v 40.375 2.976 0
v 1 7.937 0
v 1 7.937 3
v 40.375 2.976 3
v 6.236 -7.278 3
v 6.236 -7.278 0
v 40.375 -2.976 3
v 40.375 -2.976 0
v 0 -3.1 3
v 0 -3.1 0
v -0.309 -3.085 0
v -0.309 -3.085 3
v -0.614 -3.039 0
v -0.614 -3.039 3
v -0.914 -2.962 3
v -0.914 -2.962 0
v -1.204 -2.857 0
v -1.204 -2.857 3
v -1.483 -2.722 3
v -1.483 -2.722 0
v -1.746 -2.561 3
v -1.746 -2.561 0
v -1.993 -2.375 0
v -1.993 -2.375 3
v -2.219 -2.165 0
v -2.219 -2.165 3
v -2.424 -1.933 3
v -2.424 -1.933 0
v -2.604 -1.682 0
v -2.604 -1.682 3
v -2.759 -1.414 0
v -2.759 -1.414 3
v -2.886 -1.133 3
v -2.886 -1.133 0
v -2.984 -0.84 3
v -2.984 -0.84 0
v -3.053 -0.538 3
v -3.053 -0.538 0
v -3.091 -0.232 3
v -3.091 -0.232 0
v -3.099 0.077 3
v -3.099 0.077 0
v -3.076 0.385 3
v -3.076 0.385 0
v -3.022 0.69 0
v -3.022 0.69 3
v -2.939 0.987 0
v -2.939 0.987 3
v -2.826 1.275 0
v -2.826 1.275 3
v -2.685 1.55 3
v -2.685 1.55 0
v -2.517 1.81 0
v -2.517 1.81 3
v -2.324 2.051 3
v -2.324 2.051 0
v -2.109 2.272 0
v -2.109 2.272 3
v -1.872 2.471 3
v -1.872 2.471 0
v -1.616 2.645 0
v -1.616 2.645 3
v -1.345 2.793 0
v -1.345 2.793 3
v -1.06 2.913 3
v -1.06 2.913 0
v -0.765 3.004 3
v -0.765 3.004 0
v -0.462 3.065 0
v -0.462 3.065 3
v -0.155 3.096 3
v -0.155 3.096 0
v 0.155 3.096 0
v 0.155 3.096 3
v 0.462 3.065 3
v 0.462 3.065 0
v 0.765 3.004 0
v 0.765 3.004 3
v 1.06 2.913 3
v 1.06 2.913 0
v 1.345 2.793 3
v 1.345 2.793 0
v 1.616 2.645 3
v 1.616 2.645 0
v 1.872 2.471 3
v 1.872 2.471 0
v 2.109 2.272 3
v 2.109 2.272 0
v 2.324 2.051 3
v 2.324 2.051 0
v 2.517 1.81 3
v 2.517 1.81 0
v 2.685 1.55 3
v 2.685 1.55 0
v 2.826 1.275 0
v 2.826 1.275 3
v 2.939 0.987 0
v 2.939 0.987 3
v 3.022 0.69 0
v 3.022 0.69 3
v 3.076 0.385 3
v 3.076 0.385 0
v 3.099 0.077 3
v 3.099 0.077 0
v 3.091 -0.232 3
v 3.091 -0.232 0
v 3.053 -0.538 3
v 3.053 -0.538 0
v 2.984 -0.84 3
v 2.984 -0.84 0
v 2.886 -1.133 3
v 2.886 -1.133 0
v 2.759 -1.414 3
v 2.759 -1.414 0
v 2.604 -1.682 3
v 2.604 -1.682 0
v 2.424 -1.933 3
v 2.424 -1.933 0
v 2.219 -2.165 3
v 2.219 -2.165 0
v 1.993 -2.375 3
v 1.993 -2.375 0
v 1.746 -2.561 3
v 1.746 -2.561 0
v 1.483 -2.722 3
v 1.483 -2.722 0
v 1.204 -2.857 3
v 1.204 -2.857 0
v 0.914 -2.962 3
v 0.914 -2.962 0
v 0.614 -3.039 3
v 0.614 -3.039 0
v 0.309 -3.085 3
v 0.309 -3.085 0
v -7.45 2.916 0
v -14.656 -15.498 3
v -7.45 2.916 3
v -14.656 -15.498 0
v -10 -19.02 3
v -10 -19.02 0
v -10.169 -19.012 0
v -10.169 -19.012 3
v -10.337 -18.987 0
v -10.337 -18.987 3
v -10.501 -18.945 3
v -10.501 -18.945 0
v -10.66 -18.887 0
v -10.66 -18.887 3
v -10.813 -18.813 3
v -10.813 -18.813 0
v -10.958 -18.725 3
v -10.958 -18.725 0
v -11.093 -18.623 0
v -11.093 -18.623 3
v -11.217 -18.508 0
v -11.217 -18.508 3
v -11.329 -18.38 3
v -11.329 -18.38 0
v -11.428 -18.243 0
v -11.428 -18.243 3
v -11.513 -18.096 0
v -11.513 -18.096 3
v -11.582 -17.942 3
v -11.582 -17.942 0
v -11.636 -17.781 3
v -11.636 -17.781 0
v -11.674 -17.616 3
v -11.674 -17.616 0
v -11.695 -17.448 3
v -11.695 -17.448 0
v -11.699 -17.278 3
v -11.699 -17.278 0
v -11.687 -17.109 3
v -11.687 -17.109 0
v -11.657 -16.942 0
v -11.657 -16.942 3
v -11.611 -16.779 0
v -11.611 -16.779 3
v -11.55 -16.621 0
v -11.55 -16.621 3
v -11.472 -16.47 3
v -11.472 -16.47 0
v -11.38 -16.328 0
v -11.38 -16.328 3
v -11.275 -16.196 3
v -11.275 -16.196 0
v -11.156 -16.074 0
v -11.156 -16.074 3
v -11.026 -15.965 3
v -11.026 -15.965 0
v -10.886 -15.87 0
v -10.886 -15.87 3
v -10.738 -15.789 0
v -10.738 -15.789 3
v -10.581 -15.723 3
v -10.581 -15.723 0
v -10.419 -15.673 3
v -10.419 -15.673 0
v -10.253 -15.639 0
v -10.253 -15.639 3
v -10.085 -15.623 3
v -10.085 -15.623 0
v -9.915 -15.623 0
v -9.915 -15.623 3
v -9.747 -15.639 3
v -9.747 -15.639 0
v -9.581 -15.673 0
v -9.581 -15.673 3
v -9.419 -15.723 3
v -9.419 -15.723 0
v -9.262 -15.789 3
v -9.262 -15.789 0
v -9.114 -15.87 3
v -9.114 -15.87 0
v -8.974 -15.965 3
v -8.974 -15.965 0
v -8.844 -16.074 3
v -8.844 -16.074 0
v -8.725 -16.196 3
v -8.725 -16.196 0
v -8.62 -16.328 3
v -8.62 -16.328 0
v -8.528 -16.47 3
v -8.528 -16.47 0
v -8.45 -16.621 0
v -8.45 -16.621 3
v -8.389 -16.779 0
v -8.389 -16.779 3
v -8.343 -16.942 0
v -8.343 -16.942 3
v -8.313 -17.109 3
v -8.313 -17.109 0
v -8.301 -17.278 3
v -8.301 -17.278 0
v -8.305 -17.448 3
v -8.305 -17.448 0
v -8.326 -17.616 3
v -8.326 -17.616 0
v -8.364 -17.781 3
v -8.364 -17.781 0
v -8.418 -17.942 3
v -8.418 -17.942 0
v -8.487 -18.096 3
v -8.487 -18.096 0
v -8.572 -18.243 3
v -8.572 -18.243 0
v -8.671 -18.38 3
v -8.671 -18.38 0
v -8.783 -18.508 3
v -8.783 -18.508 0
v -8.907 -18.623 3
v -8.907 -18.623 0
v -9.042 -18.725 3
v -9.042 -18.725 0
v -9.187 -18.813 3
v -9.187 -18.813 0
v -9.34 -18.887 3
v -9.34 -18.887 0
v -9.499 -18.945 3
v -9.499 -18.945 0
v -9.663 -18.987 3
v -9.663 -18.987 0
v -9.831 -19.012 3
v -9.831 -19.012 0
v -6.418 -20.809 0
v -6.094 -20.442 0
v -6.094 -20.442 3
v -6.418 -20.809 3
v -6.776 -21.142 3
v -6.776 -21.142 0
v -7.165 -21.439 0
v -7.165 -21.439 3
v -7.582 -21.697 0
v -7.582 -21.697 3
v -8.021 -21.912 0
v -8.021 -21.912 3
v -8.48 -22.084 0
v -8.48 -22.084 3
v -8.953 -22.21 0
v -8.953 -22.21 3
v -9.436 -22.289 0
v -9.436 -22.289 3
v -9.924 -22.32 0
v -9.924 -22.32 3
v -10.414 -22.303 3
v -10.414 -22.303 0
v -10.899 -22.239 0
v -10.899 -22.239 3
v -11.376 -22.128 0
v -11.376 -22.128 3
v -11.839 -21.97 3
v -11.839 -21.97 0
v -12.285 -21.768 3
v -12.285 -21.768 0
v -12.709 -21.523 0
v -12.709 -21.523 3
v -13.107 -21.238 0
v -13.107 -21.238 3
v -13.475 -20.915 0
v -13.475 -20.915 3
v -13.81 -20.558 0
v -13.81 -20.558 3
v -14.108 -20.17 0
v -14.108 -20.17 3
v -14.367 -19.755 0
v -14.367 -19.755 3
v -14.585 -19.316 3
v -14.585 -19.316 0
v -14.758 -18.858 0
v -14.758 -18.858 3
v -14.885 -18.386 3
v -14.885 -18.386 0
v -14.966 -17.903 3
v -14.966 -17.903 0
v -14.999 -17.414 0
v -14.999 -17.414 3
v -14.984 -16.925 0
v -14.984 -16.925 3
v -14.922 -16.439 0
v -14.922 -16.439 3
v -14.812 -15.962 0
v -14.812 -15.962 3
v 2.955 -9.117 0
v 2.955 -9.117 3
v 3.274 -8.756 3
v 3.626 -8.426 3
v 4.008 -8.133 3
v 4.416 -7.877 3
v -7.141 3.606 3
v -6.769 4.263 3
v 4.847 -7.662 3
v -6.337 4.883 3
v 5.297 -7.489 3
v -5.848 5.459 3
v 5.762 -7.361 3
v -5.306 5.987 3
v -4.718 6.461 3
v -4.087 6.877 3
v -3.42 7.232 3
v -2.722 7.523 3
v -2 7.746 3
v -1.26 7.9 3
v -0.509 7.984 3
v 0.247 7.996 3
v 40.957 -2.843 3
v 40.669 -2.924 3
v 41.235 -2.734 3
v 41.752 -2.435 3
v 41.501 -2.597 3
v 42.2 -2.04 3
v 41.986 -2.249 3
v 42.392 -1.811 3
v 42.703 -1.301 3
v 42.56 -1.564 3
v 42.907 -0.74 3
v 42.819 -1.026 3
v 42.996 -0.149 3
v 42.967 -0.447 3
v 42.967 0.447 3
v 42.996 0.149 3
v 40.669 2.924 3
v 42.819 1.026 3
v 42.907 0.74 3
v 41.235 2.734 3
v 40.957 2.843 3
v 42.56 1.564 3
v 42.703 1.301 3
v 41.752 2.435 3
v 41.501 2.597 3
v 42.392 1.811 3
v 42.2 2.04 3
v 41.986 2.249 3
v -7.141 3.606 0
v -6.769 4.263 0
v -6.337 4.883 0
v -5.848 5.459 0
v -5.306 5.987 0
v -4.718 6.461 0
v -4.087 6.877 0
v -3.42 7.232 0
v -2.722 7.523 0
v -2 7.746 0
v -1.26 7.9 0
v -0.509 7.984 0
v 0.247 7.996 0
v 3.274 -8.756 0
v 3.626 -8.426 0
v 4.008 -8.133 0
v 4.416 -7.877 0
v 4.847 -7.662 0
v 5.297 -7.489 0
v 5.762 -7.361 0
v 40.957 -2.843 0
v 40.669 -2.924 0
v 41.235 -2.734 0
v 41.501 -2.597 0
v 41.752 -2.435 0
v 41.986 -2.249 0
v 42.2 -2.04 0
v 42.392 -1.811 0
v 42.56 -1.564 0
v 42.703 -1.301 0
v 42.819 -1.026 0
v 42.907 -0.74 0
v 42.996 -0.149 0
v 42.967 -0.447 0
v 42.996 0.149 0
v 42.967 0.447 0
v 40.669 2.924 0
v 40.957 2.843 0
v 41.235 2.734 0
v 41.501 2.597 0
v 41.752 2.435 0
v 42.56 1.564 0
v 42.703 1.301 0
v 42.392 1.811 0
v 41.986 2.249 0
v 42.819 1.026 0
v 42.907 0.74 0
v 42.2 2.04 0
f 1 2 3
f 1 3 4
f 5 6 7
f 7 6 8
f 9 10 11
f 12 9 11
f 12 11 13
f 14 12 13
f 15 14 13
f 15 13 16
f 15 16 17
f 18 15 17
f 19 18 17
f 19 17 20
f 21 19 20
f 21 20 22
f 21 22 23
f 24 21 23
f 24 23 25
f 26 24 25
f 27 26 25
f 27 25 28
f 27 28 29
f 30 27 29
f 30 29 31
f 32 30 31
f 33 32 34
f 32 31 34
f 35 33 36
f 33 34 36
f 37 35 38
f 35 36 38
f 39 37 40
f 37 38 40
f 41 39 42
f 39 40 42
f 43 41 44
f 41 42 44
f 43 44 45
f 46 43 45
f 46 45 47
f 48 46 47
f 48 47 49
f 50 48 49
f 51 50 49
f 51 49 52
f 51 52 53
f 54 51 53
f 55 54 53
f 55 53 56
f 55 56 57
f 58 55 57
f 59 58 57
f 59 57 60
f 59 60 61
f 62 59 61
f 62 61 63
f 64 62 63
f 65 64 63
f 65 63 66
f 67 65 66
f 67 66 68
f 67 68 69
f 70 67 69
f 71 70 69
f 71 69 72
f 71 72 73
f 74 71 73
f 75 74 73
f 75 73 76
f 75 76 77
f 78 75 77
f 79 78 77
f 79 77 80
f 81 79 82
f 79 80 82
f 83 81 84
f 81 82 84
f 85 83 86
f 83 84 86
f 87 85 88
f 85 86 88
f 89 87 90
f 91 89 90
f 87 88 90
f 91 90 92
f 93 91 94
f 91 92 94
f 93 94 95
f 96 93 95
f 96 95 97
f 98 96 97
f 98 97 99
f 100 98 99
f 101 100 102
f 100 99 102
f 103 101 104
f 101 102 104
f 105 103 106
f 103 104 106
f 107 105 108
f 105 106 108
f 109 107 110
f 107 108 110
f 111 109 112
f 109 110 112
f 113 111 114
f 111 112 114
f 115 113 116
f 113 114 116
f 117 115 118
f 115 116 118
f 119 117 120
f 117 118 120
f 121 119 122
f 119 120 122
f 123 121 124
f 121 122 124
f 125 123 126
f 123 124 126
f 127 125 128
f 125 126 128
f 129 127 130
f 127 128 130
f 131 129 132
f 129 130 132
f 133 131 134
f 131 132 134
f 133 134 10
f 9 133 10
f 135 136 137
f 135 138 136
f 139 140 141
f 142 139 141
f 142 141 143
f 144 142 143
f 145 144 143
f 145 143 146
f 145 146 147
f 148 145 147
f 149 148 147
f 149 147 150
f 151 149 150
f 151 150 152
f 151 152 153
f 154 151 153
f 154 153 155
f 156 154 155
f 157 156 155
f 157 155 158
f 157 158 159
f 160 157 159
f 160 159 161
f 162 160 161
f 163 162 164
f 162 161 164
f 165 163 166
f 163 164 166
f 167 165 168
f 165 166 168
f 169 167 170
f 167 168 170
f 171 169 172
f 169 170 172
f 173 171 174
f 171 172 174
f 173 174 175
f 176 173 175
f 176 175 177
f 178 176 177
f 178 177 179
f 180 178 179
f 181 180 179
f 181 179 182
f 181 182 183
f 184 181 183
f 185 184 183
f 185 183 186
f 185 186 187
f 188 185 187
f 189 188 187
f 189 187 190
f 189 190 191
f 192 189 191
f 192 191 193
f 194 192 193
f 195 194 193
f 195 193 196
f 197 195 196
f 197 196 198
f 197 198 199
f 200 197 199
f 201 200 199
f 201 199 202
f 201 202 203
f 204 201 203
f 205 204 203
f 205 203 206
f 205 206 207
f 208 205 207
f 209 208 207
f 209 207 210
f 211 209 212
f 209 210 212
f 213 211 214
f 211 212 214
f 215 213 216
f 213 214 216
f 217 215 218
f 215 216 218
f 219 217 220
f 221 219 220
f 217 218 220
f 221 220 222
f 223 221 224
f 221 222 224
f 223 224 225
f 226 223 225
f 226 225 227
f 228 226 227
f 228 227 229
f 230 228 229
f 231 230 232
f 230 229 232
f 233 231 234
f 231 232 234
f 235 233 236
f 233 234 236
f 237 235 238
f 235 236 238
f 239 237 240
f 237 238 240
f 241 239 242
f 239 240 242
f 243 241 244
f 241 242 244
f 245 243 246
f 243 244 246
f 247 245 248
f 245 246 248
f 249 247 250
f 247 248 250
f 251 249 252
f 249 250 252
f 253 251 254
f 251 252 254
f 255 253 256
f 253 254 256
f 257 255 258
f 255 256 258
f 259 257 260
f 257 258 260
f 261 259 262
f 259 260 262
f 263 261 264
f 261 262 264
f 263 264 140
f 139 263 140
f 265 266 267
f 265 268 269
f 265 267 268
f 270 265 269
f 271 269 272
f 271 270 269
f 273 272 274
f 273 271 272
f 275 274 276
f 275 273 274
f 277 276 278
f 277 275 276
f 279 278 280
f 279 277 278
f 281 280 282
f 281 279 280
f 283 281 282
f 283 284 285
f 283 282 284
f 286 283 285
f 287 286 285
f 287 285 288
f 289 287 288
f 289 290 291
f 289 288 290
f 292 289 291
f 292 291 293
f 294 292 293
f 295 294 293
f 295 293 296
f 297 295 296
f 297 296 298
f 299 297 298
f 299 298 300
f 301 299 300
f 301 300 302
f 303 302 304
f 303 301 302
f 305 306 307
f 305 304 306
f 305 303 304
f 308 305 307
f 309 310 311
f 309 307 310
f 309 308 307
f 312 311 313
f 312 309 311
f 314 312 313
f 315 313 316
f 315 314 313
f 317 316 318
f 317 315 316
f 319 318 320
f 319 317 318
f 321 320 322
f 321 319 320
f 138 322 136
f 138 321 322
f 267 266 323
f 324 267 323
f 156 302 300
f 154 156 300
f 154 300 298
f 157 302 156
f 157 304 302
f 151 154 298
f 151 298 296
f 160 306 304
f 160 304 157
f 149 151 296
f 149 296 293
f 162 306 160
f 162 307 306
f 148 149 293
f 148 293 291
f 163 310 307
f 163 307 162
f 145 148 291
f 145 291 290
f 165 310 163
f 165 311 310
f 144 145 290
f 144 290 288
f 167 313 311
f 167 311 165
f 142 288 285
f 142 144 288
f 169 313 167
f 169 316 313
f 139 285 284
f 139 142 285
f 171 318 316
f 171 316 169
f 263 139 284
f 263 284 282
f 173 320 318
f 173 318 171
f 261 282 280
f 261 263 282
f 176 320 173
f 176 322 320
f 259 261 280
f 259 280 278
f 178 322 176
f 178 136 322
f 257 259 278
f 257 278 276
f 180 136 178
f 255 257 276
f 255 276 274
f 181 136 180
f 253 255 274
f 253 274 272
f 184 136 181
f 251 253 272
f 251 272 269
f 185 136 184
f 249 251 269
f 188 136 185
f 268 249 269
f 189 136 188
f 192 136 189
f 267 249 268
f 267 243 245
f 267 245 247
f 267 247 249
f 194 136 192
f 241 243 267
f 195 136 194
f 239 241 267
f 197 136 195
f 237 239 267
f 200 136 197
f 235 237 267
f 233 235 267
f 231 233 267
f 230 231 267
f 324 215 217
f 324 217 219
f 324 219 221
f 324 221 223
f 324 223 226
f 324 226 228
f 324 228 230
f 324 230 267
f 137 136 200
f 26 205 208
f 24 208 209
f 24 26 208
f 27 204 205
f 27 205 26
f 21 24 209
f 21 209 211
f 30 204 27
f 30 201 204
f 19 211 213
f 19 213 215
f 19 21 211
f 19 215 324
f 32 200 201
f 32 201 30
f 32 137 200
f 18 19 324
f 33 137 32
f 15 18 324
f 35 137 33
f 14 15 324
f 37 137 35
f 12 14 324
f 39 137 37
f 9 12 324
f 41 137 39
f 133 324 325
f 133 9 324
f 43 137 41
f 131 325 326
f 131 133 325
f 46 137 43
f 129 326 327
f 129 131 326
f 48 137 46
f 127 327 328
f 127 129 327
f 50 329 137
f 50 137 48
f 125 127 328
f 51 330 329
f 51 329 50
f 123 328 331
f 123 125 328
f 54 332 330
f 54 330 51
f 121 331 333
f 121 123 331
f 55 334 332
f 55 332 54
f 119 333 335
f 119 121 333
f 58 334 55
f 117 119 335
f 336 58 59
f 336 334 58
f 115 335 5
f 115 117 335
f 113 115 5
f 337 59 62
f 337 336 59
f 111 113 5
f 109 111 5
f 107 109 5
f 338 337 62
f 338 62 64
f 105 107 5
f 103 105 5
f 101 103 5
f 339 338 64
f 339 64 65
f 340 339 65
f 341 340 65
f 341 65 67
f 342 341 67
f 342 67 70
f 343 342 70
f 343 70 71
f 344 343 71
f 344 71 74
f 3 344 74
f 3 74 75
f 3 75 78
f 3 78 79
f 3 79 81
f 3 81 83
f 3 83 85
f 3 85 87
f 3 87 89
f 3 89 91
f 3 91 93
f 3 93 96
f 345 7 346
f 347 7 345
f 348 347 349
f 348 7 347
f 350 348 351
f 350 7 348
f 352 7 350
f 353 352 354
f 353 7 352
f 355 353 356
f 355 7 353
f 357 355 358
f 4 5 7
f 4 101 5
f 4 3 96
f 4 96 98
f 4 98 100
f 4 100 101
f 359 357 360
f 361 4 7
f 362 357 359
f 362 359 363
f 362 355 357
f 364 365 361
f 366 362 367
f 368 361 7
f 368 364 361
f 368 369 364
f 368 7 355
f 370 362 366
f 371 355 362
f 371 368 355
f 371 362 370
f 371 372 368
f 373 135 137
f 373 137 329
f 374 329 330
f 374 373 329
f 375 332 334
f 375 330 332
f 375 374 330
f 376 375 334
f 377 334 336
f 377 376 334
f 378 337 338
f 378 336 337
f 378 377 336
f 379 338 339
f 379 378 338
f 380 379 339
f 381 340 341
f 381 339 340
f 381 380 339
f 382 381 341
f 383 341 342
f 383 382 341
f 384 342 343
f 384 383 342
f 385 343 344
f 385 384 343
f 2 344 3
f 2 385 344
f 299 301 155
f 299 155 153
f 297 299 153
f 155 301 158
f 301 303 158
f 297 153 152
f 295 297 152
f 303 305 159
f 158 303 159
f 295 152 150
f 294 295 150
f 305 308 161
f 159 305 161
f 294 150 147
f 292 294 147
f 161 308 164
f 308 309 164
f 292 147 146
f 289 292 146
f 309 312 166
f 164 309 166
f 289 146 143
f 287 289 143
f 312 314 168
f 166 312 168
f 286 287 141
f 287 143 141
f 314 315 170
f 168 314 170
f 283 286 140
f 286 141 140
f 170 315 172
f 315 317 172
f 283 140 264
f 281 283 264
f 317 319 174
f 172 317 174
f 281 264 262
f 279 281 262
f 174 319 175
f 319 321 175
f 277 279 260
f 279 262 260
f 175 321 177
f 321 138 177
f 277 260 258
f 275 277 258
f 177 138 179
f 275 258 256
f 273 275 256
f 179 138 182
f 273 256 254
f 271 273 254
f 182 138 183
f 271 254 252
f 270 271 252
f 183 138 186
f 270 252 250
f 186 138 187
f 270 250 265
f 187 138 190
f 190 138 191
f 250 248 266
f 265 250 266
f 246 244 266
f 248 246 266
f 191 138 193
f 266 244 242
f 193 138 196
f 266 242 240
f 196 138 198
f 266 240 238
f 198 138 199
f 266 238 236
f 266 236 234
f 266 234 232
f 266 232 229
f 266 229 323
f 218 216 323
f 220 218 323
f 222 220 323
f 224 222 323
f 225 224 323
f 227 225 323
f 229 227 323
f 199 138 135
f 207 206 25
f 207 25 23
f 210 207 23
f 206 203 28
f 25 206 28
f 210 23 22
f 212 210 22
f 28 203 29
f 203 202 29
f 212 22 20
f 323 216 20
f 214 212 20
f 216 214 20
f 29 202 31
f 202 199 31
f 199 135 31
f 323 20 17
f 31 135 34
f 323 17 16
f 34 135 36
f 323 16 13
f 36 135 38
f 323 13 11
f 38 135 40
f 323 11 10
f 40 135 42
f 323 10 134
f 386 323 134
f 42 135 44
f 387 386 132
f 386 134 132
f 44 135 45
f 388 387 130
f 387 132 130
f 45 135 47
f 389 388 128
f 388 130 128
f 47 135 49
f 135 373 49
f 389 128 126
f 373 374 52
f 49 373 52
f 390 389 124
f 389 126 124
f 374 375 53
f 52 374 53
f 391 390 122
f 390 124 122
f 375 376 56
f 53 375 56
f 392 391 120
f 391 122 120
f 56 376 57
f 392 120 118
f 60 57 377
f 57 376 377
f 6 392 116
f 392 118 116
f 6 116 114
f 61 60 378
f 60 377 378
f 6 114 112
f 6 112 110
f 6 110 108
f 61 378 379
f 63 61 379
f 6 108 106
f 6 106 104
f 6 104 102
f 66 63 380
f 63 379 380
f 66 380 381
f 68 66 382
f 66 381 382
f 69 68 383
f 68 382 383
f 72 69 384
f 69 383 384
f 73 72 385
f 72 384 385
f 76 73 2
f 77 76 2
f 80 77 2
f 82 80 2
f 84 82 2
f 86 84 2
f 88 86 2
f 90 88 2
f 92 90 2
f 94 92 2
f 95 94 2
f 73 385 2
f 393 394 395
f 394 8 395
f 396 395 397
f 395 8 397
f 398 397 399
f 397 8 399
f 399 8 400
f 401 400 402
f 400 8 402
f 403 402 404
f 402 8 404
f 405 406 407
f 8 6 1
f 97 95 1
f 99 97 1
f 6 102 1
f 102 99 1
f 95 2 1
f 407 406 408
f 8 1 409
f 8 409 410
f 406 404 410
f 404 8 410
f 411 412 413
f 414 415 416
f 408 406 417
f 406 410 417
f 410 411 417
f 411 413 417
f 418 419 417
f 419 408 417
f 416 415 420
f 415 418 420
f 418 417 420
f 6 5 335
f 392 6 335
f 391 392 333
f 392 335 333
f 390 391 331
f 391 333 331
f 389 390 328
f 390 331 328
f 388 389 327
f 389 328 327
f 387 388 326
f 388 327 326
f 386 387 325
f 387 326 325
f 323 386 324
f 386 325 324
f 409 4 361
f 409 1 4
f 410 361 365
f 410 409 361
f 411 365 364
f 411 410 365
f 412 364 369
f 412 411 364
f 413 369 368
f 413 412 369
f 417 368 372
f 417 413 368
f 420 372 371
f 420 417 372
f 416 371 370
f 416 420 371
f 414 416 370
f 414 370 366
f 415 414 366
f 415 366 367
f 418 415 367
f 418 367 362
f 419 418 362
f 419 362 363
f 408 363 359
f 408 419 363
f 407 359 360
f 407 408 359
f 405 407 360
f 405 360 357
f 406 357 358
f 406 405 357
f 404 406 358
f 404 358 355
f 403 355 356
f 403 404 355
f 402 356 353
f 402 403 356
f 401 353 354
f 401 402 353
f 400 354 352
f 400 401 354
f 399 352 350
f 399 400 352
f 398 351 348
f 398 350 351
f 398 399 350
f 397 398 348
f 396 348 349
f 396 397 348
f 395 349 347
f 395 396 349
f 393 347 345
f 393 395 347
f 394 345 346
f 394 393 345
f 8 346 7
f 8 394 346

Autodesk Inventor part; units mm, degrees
ref_plane "YZ Plane" through (0, 0, 0) normal (1, 0, 0) x (0, 1, 0)
ref_plane "XZ Plane" through (0, 0, 0) normal (0, 1, 0) x (-1, 0, 0)
ref_plane "XY Plane" through (0, 0, 0) normal (0, 0, 1) x (1, 0, 0)
sketch "Sketch1" plane through (0, 0, 0) normal (0, 0, 1) x (1, 0, 0)
  circle A0 centre (0, 0) radius 8
  line L0 (1, 7.9373) -> (40.375, 2.9765)
  line L1 (1, -7.9373) -> (40.375, -2.9765)
  line L2 (0, 0) -> (40, 0) construction
  circle A1 centre (40, 0) radius 3
  circle A2 centre (-10, -17.3205) radius 5
  line L3 (-6.0939, -20.4417) -> (6.2498, -4.994)
  line L4 (-14.6561, -15.4983) -> (-7.4498, 2.9155)
  line L5 (0, 0) -> (-10, -17.3205) construction
  dimension "d0" = 16
  dimension "d1" = 6
  dimension "d2" = 40
  dimension "d3" = 10
  dimension "d4" = 20
  dimension "d5" = 120
extrude "Extrusion1" add sketch "Sketch1" along normal blind 3
fillet "Fillet1" radius 5 1 edges at (4.2224, -7.5313, 1.5)
sketch "Sketch2" plane through (0, 0, 3) normal (0, 0, 1) x (1, 0, 0)
  point P0 (0, 0)
  point P1 (0, 0)
hole "Hole1" at (0, 0, 3) direction (0, 0, -1) diameter 6.2 end through all
sketch "Sketch3" plane through (0, 0, 3) normal (0, 0, 1) x (1, 0, 0)
  arc A0 (-14.6561, -15.4983) -> (-6.0939, -20.4417) centre (-10, -17.3205) ccw projected
  point P0 (0, 0)
hole "Hole2" at (-10, -17.3205, 3) direction (0, 0, -1) diameter 3.4 end through all clearance for "Socket Head Cap Screw" size "M3" standard "Ansi Metric M Profile"
properties part number "Timing_Lever" material "Nylon 6/6"
